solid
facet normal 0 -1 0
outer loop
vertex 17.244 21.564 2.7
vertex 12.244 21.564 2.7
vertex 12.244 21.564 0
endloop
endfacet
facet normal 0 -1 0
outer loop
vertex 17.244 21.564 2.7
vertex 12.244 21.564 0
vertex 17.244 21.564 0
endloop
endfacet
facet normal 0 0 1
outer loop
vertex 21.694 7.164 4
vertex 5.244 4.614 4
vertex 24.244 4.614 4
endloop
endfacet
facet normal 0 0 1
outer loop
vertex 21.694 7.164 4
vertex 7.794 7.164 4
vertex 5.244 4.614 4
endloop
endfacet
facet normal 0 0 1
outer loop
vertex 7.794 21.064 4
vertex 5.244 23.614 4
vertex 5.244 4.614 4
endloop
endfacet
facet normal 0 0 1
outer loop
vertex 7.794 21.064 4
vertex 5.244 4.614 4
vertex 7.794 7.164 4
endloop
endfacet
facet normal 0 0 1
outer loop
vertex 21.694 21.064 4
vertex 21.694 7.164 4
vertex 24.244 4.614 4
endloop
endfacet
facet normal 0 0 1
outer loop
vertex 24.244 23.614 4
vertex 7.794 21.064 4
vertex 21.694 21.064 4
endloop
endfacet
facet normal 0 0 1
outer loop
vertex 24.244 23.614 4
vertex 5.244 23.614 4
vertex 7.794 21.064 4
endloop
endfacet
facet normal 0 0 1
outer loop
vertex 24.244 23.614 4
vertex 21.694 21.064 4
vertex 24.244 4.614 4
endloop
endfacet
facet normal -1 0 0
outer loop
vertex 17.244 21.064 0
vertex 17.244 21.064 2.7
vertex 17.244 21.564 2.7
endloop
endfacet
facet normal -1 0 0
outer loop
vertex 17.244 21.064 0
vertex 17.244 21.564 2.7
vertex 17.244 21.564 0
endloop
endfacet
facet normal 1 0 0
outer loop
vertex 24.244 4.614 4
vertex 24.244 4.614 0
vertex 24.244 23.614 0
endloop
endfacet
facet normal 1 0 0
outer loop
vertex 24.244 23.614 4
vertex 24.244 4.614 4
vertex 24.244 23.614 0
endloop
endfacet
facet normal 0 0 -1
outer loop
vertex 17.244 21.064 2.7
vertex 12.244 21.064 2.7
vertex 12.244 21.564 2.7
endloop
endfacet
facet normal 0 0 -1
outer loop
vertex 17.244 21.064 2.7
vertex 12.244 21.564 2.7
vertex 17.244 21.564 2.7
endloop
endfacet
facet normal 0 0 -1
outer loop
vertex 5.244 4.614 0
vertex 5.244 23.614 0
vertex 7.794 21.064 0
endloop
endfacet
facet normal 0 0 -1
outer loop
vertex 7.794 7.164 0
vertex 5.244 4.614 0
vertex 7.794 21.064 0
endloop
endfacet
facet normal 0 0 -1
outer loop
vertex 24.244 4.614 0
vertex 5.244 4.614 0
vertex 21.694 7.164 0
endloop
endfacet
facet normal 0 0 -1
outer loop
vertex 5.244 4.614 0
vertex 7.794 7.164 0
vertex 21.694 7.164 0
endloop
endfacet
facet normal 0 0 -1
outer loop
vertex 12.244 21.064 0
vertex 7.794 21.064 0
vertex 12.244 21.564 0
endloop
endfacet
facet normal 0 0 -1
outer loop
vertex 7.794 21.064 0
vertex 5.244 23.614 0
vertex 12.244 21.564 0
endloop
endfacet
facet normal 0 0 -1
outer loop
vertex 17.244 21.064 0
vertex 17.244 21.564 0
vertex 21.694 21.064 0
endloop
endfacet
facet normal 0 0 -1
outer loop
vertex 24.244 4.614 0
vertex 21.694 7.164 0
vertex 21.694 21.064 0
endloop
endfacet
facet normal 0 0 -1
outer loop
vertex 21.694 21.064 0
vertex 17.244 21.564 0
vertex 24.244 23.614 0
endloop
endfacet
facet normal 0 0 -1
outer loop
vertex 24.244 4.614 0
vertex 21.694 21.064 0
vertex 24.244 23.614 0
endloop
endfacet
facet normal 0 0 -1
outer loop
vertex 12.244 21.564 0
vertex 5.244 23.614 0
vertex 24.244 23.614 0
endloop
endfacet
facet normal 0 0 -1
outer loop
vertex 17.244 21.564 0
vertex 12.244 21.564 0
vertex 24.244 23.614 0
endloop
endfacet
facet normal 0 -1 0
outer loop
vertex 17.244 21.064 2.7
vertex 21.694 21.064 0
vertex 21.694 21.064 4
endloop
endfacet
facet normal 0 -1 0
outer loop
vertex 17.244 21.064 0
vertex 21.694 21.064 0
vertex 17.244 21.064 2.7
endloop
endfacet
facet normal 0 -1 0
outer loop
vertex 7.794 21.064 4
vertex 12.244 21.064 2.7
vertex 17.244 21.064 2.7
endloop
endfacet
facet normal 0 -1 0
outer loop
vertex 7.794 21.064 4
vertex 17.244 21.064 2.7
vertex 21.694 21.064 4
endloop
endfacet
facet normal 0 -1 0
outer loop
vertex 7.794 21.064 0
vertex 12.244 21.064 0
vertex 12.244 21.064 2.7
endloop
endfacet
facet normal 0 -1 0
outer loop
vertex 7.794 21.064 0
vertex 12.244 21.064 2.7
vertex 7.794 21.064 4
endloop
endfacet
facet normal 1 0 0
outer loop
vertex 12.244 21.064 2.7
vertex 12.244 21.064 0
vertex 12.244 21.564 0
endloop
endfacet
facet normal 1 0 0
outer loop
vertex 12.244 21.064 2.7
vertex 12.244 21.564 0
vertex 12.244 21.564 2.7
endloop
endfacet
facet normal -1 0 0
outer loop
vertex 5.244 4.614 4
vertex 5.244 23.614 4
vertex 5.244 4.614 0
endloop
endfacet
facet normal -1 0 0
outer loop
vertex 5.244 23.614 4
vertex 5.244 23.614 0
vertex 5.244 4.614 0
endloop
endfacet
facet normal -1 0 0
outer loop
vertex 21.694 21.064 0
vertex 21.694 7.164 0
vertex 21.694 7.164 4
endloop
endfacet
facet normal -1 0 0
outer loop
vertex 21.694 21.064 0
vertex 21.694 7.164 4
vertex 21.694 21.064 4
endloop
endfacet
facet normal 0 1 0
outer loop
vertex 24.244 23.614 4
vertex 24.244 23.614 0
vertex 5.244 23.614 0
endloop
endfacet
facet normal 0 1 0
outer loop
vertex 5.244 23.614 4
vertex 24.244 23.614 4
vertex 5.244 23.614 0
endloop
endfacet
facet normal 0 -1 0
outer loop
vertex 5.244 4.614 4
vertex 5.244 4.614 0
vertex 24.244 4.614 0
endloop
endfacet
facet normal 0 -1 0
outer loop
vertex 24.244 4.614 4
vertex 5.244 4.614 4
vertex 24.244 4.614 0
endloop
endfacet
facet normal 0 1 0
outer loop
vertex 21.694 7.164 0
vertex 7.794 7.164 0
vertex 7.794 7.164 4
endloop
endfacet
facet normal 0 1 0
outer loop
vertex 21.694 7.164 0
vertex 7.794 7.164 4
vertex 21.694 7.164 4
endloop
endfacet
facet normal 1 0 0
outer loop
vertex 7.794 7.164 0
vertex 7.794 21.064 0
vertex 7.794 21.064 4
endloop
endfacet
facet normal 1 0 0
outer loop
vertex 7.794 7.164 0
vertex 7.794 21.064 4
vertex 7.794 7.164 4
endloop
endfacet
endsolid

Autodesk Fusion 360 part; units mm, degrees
sketch "Sketch1" plane through (0, 0, 0) normal (0, 0, 1) x (1, 0, 0)
  line L0 (5.2435, 4.6143) -> (24.2435, 4.6143)
  line L1 (24.2435, 4.6143) -> (24.2435, 23.6143)
  line L2 (24.2435, 23.6143) -> (5.2435, 23.6143)
  line L3 (5.2435, 23.6143) -> (5.2435, 4.6143)
  line L4 (5.2435, 23.6143) -> (24.2435, 4.6143) construction
  line L5 (24.2435, 23.6143) -> (5.2435, 4.6143) construction
  line L6 (5.2435, 4.6143) -> (10.3435, 4.6143) construction
  line L7 (5.2435, 4.6143) -> (7.7935, 4.6143) construction
  line L8 (7.7935, 4.6143) -> (7.7935, 23.6143) construction
  line L9 (7.7935, 7.1643) -> (21.6935, 7.1643)
  line L10 (21.6935, 7.1643) -> (21.6935, 21.0643)
  line L11 (21.6935, 21.0643) -> (7.7935, 21.0643)
  line L12 (7.7935, 21.0643) -> (7.7935, 7.1643)
  dimension "d1" = 19
  dimension "d2" = 19
  dimension "d4" = 2.55
  dimension "d5" = 13.9
  dimension "d6" = 13.9
extrude "Extrude1" add sketch "Sketch1" along normal blind 4
sketch "Sketch2" plane through (0, 21.0643, 0) normal (0, -1, 0) x (1, 0, 0)
  line L0 (7.7935, 0) -> (21.6935, 0)
  line L1 (21.6935, 0) -> (21.6935, 4)
  line L2 (21.6935, 4) -> (7.7935, 4)
  line L3 (7.7935, 4) -> (7.7935, 0)
  line L4 (14.7435, 0) -> (17.2435, 0) construction
  line L5 (17.2435, 0) -> (12.2435, 0)
  line L6 (12.2435, 0) -> (12.2435, 2.7)
  line L7 (12.2435, 2.7) -> (17.2435, 2.7)
  line L8 (17.2435, 2.7) -> (17.2435, 0)
  dimension "d9" = 2.5
  dimension "d10" = 5
  dimension "d11" = 2.7
extrude "Extrude2" add sketch "Sketch2" along normal blind 0.5 contours L0 L5 L6 L7 L8
extrude "Extrude3" cut 1 faces at (13.9102, 20.5643, 0.9) along direction (0, 1, 0) blind 1
